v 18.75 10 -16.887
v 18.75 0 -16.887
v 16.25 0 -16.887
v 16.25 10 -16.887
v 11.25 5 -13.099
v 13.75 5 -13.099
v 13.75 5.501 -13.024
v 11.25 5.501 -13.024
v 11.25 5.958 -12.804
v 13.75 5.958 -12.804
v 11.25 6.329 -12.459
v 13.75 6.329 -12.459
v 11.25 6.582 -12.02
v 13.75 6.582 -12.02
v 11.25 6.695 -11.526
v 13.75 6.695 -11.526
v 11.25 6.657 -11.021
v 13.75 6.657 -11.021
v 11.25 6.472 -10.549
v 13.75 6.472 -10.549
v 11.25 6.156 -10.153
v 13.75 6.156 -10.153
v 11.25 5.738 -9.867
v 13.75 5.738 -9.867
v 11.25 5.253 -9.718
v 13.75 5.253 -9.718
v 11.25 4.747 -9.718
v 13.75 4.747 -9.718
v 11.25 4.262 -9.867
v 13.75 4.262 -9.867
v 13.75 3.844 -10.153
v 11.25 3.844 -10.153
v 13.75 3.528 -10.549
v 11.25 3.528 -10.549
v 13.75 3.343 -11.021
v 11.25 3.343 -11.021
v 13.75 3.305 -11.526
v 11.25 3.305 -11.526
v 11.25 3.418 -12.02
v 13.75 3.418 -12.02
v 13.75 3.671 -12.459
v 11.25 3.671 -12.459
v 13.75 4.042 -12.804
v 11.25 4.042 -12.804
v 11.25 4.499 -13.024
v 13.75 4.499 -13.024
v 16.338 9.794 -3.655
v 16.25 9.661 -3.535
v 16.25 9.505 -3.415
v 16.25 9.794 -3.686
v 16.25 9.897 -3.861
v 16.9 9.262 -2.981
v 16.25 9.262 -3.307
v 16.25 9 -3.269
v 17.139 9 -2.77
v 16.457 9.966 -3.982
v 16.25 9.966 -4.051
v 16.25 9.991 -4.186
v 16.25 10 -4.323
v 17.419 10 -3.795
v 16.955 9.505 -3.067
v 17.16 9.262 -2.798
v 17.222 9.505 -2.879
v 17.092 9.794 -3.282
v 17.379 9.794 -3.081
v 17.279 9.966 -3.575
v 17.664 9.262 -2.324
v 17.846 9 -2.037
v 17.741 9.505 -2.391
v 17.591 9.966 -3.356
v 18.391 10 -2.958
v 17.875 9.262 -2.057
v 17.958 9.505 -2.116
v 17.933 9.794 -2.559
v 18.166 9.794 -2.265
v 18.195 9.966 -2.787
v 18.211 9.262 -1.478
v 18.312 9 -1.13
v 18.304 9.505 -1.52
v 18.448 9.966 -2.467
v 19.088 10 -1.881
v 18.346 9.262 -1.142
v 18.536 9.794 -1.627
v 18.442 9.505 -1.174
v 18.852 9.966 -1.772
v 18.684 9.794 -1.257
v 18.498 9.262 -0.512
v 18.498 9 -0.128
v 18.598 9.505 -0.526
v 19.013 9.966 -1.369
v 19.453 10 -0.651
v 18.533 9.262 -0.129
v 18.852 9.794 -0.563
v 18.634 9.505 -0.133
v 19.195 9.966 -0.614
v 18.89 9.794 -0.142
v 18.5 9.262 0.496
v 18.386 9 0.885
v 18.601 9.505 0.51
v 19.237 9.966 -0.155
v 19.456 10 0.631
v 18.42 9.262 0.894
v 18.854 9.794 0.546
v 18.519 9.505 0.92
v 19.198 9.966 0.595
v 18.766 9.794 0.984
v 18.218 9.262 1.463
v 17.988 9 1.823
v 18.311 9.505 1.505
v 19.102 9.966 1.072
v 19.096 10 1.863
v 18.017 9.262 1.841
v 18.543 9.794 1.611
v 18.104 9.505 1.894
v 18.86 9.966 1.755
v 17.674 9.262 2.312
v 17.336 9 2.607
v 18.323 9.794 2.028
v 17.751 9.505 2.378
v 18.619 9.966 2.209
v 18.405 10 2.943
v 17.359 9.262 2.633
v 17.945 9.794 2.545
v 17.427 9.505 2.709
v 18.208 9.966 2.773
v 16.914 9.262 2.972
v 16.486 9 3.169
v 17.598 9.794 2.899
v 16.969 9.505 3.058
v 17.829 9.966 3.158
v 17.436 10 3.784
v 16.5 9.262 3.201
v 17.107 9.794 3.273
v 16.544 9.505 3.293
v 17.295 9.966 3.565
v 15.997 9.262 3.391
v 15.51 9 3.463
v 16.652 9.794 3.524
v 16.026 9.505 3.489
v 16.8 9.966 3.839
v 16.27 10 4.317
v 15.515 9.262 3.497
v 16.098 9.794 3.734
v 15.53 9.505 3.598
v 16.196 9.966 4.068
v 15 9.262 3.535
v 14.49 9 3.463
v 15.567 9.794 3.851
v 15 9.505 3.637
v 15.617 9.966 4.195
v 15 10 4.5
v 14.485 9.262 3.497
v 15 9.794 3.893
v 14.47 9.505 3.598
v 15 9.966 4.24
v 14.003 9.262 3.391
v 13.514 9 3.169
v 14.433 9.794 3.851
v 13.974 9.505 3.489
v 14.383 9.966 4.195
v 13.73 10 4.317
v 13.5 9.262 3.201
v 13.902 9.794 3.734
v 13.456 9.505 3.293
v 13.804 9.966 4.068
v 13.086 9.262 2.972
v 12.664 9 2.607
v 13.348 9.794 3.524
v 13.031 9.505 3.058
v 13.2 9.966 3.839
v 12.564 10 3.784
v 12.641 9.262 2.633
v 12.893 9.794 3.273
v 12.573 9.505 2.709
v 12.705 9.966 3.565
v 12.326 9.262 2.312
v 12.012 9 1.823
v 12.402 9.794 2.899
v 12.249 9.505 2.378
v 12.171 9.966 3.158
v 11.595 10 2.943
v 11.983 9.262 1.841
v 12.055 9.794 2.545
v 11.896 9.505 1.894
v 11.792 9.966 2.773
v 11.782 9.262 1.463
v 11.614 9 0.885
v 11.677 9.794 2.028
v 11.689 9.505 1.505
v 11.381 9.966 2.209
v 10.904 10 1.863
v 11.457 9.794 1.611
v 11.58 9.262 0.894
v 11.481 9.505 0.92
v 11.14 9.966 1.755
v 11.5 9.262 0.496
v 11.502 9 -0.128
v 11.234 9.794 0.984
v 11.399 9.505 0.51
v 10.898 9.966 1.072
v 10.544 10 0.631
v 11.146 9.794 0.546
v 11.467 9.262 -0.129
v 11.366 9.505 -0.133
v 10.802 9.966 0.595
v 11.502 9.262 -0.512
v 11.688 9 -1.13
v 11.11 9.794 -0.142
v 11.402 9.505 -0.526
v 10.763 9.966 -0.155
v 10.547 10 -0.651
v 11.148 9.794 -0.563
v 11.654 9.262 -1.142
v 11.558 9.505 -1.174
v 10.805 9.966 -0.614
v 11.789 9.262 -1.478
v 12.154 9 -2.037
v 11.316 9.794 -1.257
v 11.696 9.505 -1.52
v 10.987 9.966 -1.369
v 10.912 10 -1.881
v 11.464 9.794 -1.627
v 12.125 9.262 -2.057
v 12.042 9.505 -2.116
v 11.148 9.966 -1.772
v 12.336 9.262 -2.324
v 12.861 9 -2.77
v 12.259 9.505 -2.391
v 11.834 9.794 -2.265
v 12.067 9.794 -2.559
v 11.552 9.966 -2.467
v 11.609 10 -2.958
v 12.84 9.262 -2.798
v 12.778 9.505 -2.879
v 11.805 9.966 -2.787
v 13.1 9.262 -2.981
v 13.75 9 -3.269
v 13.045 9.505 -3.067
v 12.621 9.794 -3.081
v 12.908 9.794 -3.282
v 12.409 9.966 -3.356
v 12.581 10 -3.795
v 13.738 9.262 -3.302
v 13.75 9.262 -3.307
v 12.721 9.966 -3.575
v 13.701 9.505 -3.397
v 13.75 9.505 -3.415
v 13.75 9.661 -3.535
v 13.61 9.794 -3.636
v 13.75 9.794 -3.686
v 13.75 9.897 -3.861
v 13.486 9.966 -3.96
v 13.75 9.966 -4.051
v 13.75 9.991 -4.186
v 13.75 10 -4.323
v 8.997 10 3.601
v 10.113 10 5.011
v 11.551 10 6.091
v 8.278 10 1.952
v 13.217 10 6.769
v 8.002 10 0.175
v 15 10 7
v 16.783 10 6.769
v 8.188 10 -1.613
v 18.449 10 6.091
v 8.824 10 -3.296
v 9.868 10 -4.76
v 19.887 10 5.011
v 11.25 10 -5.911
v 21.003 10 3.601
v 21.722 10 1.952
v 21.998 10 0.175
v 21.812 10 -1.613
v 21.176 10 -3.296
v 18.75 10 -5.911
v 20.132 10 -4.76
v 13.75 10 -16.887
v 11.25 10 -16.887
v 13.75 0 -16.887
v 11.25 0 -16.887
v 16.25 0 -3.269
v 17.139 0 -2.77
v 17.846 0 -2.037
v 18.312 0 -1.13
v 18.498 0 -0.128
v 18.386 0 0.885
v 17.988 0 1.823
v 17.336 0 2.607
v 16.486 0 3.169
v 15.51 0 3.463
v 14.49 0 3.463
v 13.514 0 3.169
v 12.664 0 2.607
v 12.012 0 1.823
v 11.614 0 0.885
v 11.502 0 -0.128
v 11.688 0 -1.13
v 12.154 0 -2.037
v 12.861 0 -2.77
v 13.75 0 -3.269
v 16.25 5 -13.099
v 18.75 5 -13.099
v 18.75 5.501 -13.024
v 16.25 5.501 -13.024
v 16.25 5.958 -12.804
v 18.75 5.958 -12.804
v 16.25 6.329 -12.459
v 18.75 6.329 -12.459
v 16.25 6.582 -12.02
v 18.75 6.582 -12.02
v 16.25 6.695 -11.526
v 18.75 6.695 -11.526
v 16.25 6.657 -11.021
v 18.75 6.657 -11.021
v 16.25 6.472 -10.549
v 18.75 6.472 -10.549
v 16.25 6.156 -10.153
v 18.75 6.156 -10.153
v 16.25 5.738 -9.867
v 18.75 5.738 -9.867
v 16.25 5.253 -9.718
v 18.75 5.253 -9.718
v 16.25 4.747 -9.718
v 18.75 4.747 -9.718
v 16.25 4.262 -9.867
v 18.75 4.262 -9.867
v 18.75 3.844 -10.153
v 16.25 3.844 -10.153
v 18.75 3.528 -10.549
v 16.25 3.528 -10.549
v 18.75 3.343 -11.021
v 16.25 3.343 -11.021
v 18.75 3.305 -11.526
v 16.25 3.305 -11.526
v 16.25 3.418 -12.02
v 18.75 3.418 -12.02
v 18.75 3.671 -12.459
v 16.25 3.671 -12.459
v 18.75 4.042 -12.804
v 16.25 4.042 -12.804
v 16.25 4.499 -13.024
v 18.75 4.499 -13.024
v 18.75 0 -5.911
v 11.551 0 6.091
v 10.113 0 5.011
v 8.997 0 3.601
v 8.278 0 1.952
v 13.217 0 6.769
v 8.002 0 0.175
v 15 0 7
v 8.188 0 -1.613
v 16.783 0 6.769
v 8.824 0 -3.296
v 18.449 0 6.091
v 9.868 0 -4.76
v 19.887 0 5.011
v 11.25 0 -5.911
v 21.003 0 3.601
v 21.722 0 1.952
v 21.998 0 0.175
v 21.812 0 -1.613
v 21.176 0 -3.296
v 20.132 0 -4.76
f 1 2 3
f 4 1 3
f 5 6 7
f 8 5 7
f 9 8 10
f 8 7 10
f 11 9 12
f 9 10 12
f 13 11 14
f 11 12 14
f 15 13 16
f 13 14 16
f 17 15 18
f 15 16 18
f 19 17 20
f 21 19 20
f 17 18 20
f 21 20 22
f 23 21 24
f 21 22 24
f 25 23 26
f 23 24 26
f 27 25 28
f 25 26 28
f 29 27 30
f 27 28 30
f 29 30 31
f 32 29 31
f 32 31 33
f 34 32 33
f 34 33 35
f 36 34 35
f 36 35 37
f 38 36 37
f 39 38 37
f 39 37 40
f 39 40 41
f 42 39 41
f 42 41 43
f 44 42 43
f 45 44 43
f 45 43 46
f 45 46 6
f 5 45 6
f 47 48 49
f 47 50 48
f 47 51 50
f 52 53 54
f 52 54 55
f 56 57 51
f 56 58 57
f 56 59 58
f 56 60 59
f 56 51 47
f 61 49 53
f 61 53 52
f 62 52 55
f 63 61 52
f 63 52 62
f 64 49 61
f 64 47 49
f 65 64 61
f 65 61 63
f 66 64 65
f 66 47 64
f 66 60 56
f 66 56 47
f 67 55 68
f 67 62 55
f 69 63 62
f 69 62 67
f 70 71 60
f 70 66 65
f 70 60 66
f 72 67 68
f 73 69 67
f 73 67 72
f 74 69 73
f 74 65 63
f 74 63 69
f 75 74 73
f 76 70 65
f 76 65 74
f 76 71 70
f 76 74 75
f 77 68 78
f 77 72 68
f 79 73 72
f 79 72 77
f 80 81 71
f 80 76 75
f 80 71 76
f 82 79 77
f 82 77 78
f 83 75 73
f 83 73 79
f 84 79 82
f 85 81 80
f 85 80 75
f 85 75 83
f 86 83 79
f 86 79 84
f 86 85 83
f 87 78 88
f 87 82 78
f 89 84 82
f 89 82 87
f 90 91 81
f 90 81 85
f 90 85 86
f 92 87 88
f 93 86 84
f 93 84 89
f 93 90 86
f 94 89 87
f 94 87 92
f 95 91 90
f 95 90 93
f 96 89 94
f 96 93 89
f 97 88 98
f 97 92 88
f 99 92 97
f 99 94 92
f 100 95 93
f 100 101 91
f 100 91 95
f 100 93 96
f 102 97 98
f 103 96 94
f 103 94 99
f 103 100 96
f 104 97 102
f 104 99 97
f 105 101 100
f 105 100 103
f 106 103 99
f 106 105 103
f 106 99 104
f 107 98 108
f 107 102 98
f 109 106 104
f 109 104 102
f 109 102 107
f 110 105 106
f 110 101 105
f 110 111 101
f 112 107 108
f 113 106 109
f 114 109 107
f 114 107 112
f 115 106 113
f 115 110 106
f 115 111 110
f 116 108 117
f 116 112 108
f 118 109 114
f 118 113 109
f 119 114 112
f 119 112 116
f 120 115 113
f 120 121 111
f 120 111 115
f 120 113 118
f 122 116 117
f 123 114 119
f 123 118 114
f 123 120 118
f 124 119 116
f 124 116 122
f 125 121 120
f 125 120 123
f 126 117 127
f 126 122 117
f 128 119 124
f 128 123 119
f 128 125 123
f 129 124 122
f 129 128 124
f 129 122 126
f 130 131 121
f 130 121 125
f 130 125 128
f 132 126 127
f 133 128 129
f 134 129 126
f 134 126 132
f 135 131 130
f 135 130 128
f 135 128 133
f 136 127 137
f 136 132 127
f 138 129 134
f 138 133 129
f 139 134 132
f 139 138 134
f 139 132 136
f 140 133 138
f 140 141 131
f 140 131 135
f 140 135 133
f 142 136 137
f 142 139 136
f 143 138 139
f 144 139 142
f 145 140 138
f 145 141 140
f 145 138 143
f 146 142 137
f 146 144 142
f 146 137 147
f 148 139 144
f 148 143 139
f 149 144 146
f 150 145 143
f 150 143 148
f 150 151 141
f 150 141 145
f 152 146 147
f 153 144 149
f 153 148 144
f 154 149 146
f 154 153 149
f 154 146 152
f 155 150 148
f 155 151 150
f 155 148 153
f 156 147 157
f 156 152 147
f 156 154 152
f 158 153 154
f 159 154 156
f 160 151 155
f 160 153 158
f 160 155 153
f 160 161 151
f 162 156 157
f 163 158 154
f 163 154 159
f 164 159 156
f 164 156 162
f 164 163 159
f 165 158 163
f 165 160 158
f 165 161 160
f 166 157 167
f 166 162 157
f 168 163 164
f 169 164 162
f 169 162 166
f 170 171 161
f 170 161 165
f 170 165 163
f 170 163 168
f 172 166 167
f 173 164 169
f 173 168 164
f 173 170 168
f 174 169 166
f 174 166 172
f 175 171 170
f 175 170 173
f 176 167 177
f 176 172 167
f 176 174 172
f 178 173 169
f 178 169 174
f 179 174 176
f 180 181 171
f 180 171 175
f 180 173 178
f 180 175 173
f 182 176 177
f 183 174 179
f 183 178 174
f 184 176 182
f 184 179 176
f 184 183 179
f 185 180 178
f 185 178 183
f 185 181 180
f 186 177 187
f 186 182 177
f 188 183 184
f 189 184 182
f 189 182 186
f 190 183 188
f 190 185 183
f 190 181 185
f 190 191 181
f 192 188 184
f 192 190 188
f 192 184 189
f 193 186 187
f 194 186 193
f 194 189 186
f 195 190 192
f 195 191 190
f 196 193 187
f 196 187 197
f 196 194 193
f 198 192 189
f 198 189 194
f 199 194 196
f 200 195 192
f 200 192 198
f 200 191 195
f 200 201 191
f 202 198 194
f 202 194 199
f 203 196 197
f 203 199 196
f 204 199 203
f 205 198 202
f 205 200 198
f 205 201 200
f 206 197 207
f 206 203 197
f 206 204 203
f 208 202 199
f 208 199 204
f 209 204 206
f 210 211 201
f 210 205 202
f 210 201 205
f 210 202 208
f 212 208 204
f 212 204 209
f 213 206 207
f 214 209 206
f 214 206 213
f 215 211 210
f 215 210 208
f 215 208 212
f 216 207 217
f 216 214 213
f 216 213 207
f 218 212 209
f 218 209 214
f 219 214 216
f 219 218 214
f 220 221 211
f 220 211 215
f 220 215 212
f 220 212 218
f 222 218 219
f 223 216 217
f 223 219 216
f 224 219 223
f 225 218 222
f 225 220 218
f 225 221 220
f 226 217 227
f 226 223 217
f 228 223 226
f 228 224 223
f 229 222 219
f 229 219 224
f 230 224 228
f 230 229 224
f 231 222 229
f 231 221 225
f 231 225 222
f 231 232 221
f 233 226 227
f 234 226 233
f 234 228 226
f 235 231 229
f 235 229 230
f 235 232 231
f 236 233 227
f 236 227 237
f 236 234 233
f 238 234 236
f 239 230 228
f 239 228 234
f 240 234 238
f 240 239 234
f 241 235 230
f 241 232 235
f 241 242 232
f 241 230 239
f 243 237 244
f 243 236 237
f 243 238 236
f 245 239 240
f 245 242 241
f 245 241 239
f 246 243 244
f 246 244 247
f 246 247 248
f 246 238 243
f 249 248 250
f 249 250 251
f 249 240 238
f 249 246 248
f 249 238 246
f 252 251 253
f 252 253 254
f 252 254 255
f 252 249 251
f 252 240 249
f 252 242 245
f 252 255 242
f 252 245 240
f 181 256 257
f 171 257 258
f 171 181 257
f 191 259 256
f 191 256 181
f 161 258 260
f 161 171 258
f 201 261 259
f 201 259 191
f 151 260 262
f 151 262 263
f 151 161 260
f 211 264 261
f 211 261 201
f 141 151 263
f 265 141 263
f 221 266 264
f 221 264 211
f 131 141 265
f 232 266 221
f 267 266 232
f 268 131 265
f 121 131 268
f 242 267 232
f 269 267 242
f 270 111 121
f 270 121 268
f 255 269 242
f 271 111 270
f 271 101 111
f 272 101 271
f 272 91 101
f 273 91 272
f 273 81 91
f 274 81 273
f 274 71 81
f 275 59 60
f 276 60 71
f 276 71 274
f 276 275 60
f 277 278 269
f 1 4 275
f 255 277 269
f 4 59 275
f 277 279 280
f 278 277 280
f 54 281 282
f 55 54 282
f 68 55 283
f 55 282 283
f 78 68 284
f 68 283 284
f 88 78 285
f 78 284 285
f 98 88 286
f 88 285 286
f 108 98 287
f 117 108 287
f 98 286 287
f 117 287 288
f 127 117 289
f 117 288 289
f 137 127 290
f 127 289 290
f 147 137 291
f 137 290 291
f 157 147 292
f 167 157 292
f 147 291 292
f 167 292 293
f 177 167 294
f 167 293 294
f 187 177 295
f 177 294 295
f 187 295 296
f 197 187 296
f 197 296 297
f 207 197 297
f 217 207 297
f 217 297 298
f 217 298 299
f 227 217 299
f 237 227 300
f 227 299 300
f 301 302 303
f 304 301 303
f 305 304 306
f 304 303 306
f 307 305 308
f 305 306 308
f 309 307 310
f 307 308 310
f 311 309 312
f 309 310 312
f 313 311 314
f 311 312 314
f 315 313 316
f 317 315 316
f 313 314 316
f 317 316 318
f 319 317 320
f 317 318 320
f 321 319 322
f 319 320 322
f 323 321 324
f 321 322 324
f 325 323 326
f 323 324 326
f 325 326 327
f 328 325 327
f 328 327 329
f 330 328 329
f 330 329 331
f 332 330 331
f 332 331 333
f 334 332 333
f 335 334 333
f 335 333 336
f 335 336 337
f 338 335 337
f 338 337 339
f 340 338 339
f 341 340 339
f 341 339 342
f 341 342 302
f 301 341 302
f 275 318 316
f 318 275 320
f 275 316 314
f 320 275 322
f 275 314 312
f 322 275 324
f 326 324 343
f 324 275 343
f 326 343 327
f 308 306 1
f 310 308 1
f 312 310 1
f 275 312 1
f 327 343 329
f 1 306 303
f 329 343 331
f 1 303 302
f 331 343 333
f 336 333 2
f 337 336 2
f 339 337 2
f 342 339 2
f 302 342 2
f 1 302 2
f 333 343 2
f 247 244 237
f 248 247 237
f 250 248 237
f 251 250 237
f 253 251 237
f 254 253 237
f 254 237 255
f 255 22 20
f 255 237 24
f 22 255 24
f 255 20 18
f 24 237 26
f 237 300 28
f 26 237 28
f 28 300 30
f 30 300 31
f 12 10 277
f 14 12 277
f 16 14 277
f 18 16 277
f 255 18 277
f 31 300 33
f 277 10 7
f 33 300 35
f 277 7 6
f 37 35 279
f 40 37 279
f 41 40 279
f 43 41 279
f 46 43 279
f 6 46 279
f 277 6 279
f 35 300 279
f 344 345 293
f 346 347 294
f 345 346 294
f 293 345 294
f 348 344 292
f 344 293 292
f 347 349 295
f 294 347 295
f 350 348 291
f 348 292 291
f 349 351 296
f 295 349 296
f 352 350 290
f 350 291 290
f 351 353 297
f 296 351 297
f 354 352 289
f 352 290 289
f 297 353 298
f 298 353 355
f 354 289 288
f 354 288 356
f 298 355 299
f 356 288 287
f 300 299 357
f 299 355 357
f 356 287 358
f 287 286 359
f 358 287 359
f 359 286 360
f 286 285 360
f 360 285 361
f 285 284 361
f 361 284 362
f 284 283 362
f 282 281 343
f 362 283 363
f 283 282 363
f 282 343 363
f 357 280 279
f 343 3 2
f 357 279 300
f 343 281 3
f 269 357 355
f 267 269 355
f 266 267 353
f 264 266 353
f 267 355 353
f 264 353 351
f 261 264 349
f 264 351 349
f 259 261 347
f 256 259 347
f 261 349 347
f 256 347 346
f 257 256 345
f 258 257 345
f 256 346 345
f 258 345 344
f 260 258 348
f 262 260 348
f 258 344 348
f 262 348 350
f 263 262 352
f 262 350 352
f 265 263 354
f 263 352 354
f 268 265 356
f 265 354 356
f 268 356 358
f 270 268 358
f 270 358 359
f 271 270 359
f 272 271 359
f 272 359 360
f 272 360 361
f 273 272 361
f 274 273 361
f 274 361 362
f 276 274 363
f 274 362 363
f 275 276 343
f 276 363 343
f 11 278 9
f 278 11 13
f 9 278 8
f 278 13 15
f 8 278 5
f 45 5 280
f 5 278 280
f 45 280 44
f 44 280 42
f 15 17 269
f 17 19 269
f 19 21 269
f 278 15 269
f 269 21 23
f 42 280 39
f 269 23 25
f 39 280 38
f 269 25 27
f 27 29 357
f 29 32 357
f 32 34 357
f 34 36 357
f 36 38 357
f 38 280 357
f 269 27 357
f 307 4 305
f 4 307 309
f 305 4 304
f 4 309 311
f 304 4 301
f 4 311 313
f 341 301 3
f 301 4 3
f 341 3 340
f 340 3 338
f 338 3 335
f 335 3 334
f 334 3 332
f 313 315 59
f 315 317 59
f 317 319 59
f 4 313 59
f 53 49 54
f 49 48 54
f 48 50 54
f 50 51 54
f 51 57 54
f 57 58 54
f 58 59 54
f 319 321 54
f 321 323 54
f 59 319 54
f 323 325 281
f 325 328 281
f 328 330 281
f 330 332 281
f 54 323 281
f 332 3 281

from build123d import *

# Parameters (mm, degrees)
BOSS_EXTRUDE1_DEPTH = 10
CUT_EXTRUDE1_REACH  = 24.377
SKETCH2_R           = 1.7
FILLET1_R           = 1


with BuildPart() as part:
    # Sketch1 → Boss-Extrude1 (new body)
    with BuildSketch(Plane(origin=(0, 0, 0), x_dir=(1, 0, 0), z_dir=(0, 1, 0))):
        with BuildLine():
            Line((13.75, 3.269174208), (13.75, 16.887488657))
            Line((13.75, 16.887488657), (11.25, 16.887488657))
            Line((11.25, 16.887488657), (11.25, 5.910795209))
            ThreePointArc((11.25, 5.910795209), (15, -7), (18.75, 5.910795209))
            Line((18.75, 5.910795209), (18.75, 16.887488657))
            Line((18.75, 16.887488657), (16.25, 16.887488657))
            Line((16.25, 16.887488657), (16.25, 3.269174208))
            ThreePointArc((16.25, 3.269174208), (15, -3.5), (13.75, 3.269174208))
        make_face()
    extrude(amount=BOSS_EXTRUDE1_DEPTH)

    # Cut-Extrude1: up to this face of the body (flat: up to its plane)
    cut_extrude1_end = Plane(part.part.faces().sort_by_distance((11.25, 5, -11.399141933))[0])
    # Sketch2 → Cut-Extrude1 (cut, up to the picked face)
    with BuildSketch(Plane(origin=(18.75, 0, 0), x_dir=(0, 0, -1), z_dir=(1, 0, 0)), mode=Mode.PRIVATE) as cut_extrude1_sk1:
        with Locations((11.399141933, 5)):
            Circle(SKETCH2_R)
    cut_extrude1_tool1 = split(extrude(cut_extrude1_sk1.sketch, amount=-CUT_EXTRUDE1_REACH, mode=Mode.PRIVATE), bisect_by=cut_extrude1_end, keep=Keep.BOTH, mode=Mode.PRIVATE)
    add(cut_extrude1_tool1.solids().sort_by(Axis((18.75, 5, -11.399142), (-1, 0, 0)))[0], mode=Mode.SUBTRACT)

    # Fillet1
    fillet1_edges = [part.edges().sort_by_distance(p)[0] for p in [
        (15, 10, 3.5),
    ]]
    fillet(fillet1_edges, radius=FILLET1_R)


solid = part.part
